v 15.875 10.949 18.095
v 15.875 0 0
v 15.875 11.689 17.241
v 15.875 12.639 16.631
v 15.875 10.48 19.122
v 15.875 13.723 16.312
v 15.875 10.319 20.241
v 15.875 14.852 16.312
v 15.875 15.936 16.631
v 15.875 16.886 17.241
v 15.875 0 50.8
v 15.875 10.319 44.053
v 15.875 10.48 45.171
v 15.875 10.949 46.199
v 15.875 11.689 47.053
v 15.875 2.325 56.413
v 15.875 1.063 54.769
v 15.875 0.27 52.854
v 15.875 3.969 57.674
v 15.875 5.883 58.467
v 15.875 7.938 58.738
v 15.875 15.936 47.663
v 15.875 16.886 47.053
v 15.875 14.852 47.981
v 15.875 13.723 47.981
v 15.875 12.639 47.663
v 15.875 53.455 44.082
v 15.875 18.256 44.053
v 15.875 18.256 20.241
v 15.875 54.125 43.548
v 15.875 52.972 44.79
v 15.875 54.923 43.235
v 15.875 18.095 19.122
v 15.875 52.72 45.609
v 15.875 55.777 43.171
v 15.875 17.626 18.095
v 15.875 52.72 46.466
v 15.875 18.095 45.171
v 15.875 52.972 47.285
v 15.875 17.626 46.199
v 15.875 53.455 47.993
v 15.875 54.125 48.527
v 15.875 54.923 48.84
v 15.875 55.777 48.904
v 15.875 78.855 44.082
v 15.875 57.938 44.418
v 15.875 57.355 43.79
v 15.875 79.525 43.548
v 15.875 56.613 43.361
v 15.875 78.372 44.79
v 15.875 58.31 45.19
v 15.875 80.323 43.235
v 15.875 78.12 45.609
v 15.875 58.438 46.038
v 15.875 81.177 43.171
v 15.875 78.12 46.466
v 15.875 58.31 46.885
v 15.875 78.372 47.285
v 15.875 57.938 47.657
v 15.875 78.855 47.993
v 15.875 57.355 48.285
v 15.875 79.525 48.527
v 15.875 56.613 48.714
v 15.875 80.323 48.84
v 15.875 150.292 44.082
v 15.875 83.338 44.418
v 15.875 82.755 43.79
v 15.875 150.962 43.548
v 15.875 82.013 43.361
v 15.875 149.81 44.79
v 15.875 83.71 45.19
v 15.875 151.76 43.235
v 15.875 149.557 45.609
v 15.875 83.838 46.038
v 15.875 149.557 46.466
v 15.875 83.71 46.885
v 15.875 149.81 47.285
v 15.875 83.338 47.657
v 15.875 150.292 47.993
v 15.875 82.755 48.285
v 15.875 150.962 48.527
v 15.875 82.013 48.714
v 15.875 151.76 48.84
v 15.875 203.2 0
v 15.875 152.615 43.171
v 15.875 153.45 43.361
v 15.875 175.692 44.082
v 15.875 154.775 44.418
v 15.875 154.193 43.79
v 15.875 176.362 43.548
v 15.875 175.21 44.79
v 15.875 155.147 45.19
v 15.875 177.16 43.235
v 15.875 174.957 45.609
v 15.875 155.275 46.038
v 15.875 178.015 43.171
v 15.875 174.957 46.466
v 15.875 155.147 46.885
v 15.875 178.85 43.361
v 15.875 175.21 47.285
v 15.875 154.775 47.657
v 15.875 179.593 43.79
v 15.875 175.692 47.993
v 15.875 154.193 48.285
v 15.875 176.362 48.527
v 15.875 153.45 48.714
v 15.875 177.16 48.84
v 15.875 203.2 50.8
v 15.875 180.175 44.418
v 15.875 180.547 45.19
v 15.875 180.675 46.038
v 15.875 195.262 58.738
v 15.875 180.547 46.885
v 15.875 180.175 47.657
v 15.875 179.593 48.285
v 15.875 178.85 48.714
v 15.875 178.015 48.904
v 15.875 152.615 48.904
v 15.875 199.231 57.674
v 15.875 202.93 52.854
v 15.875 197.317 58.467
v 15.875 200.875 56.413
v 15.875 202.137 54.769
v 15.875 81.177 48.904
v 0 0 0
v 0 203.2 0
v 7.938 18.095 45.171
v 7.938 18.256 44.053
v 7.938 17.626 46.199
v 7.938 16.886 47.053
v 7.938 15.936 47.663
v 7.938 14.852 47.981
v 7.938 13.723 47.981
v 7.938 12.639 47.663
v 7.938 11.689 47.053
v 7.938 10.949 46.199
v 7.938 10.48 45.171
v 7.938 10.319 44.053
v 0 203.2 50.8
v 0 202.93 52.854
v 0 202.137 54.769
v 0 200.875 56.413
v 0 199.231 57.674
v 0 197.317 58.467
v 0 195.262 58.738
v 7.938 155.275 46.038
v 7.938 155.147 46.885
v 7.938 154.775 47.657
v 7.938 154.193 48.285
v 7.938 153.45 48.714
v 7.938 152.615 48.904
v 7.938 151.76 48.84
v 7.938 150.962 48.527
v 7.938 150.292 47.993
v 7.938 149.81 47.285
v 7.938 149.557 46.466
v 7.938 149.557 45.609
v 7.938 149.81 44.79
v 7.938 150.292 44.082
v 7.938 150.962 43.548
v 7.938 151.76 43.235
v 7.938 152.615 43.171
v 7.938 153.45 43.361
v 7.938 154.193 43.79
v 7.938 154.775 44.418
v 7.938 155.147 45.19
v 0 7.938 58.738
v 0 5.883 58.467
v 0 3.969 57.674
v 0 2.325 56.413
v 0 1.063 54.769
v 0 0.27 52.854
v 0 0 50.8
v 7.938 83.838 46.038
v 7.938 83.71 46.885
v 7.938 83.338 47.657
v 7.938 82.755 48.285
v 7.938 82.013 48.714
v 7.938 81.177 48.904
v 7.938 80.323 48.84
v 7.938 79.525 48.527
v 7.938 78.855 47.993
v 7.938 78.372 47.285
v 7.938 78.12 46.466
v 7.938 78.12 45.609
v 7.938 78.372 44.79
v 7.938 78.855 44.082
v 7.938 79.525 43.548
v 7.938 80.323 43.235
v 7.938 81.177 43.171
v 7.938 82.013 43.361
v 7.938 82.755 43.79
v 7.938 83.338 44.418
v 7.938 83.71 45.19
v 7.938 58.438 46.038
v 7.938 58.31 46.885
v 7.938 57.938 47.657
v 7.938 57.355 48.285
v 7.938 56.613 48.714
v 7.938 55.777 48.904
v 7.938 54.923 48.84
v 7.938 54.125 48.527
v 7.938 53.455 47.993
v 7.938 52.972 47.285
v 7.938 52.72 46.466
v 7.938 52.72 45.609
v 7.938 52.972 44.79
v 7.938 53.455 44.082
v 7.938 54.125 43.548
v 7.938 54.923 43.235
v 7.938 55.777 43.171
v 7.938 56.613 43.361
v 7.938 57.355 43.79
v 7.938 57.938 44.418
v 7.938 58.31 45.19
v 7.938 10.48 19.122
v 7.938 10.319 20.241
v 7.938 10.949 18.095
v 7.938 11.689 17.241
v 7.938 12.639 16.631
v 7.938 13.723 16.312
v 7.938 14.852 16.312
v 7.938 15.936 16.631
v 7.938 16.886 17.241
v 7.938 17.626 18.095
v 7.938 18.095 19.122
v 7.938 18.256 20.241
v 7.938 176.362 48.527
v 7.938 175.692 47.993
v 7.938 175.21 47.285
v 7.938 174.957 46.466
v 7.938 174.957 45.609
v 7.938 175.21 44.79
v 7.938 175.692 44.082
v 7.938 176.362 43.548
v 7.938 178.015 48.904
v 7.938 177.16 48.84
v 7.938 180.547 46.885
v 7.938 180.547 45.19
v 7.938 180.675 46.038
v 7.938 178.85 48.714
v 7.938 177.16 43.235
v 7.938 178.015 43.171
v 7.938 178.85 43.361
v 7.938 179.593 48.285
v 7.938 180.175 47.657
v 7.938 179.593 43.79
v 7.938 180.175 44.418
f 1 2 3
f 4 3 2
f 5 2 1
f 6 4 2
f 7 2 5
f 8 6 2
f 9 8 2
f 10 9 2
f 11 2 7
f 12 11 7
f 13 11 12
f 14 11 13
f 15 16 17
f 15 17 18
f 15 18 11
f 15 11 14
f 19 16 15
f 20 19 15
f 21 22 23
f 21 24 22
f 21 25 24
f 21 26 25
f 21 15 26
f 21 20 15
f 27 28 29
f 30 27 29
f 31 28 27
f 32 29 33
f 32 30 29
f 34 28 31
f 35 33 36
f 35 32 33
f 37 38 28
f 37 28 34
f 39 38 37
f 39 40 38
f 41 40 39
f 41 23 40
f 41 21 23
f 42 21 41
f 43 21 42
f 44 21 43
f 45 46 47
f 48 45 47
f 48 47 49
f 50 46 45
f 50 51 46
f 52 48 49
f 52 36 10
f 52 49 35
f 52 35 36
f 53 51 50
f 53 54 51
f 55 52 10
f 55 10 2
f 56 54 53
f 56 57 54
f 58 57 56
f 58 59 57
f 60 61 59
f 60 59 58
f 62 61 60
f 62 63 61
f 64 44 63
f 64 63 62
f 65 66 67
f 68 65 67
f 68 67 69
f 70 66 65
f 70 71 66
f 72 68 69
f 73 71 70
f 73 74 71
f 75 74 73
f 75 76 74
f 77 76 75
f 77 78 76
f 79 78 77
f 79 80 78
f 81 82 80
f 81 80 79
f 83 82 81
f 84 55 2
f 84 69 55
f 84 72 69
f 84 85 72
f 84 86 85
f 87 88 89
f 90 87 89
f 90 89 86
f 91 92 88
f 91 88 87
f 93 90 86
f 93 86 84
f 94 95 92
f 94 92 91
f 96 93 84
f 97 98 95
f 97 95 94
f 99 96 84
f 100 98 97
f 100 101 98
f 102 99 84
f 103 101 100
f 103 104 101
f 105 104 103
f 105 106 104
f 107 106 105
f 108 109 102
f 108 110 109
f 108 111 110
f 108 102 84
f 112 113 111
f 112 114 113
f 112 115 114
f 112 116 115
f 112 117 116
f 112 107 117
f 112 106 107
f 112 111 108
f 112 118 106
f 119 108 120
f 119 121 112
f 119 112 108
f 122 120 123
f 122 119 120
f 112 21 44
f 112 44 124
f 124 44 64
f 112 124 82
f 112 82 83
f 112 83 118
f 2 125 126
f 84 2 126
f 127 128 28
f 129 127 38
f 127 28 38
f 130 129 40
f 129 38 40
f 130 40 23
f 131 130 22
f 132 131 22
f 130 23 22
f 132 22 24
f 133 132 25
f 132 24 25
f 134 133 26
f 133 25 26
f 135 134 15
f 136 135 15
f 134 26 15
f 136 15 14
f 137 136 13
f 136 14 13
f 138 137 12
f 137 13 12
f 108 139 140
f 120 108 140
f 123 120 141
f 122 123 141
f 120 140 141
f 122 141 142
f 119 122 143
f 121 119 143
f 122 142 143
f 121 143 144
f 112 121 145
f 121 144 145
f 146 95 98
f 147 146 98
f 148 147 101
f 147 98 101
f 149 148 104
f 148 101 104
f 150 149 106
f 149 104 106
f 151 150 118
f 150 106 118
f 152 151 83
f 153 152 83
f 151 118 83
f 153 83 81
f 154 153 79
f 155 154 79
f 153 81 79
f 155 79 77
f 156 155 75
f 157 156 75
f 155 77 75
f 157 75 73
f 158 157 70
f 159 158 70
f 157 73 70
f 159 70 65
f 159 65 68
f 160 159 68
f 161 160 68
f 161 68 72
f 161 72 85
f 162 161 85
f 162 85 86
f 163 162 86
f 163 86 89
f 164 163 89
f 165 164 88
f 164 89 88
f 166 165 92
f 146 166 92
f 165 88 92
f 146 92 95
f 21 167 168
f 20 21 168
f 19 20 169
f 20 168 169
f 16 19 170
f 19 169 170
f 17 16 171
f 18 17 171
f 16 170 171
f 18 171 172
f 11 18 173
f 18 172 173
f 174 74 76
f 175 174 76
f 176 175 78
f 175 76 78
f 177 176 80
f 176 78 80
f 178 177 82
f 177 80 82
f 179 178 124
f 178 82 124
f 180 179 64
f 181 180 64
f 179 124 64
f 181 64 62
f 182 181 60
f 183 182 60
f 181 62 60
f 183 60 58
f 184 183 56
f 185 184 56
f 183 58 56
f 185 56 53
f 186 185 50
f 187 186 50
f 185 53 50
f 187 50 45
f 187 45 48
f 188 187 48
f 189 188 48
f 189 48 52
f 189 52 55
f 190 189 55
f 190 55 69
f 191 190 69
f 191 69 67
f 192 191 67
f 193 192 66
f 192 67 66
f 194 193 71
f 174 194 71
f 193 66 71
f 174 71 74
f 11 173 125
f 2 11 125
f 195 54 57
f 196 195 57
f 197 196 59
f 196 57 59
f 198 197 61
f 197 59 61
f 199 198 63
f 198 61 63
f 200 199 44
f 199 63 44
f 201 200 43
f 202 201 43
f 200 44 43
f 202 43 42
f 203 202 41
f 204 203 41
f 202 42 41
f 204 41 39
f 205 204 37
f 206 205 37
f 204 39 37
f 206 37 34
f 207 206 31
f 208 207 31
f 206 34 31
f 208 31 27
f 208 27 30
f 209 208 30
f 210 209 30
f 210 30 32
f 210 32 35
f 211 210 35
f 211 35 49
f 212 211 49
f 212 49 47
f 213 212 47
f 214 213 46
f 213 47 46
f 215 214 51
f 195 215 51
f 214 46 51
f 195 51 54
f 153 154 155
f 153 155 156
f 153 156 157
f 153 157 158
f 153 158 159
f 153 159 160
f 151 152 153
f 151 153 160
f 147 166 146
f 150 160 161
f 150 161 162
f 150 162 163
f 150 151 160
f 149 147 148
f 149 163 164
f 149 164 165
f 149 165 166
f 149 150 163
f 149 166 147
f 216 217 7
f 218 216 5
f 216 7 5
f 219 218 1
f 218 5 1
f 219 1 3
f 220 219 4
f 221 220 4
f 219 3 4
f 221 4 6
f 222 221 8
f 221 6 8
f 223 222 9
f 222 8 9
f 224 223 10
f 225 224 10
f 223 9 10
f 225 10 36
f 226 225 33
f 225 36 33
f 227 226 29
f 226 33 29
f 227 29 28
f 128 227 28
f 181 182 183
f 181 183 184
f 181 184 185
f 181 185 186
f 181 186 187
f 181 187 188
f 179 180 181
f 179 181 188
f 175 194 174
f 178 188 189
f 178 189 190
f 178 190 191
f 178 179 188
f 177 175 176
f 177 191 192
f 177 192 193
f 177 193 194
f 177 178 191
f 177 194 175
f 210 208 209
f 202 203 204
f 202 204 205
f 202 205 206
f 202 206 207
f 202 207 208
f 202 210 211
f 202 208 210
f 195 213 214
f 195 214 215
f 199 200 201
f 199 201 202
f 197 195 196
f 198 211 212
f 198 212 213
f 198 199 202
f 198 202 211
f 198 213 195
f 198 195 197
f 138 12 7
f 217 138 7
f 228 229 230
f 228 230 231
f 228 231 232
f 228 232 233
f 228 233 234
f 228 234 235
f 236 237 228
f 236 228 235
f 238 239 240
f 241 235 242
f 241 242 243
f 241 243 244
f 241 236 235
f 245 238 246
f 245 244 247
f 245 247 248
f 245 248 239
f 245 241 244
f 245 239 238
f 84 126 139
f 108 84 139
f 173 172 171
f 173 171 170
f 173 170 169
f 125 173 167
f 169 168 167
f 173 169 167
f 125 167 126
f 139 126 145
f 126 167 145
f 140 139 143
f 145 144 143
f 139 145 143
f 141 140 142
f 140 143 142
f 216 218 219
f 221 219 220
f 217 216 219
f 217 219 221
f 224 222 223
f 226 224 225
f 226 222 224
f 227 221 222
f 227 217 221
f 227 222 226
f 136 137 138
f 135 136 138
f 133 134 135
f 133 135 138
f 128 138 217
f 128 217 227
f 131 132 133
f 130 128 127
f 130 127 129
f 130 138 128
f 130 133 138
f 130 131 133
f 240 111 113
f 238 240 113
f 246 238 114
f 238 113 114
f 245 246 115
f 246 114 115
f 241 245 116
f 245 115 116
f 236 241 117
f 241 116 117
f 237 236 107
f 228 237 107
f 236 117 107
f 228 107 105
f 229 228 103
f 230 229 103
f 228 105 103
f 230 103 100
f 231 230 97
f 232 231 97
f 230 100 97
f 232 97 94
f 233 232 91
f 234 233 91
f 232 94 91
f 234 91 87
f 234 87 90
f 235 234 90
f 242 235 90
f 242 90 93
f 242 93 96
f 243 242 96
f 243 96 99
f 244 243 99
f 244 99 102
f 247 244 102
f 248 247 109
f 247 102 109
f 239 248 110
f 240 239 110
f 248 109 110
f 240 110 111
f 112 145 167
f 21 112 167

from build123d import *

# Parameters (mm, degrees)
F1_DEPTH = 15.875
F2_R     = 2.875
F3_DEPTH = 7.9375


with BuildPart() as f1:
    # F0 (on Right) → F1 (new body)
    with BuildSketch(Plane.YZ):
        with BuildLine():
            Line((0, 50.8), (0, 0))
            Line((0, 0), (203.2, 0))
            Line((203.2, 0), (203.2, 50.8))
            ThreePointArc((203.2, 50.8), (200.87516, 56.41266), (195.2625, 58.7375))
            Line((195.2625, 58.7375), (7.9375, 58.7375))
            ThreePointArc((7.9375, 58.7375), (2.32484, 56.41266), (0, 50.8))
        make_face()
    extrude(amount=F1_DEPTH)

    # F2 (on face) → F3 (cut)
    with BuildSketch(Plane.YZ.offset(15.875)):
        with BuildLine():
            ThreePointArc((18.25625, 44.053125), (14.2875, 48.021875), (10.31875, 44.053125))
            Line((10.31875, 44.053125), (10.31875, 20.240625))
            ThreePointArc((10.31875, 20.240625), (14.2875, 16.271875), (18.25625, 20.240625))
            Line((18.25625, 20.240625), (18.25625, 44.053125))
        make_face()
        with Locations((55.5625, 46.0375)):
            Circle(F2_R)
        with Locations((80.9625, 46.0375)):
            Circle(F2_R)
        with Locations((152.4, 46.0375)):
            Circle(F2_R)
        with Locations((177.8, 46.0375)):
            Circle(F2_R)
    extrude(amount=-F3_DEPTH, mode=Mode.SUBTRACT)


solid = f1.part
